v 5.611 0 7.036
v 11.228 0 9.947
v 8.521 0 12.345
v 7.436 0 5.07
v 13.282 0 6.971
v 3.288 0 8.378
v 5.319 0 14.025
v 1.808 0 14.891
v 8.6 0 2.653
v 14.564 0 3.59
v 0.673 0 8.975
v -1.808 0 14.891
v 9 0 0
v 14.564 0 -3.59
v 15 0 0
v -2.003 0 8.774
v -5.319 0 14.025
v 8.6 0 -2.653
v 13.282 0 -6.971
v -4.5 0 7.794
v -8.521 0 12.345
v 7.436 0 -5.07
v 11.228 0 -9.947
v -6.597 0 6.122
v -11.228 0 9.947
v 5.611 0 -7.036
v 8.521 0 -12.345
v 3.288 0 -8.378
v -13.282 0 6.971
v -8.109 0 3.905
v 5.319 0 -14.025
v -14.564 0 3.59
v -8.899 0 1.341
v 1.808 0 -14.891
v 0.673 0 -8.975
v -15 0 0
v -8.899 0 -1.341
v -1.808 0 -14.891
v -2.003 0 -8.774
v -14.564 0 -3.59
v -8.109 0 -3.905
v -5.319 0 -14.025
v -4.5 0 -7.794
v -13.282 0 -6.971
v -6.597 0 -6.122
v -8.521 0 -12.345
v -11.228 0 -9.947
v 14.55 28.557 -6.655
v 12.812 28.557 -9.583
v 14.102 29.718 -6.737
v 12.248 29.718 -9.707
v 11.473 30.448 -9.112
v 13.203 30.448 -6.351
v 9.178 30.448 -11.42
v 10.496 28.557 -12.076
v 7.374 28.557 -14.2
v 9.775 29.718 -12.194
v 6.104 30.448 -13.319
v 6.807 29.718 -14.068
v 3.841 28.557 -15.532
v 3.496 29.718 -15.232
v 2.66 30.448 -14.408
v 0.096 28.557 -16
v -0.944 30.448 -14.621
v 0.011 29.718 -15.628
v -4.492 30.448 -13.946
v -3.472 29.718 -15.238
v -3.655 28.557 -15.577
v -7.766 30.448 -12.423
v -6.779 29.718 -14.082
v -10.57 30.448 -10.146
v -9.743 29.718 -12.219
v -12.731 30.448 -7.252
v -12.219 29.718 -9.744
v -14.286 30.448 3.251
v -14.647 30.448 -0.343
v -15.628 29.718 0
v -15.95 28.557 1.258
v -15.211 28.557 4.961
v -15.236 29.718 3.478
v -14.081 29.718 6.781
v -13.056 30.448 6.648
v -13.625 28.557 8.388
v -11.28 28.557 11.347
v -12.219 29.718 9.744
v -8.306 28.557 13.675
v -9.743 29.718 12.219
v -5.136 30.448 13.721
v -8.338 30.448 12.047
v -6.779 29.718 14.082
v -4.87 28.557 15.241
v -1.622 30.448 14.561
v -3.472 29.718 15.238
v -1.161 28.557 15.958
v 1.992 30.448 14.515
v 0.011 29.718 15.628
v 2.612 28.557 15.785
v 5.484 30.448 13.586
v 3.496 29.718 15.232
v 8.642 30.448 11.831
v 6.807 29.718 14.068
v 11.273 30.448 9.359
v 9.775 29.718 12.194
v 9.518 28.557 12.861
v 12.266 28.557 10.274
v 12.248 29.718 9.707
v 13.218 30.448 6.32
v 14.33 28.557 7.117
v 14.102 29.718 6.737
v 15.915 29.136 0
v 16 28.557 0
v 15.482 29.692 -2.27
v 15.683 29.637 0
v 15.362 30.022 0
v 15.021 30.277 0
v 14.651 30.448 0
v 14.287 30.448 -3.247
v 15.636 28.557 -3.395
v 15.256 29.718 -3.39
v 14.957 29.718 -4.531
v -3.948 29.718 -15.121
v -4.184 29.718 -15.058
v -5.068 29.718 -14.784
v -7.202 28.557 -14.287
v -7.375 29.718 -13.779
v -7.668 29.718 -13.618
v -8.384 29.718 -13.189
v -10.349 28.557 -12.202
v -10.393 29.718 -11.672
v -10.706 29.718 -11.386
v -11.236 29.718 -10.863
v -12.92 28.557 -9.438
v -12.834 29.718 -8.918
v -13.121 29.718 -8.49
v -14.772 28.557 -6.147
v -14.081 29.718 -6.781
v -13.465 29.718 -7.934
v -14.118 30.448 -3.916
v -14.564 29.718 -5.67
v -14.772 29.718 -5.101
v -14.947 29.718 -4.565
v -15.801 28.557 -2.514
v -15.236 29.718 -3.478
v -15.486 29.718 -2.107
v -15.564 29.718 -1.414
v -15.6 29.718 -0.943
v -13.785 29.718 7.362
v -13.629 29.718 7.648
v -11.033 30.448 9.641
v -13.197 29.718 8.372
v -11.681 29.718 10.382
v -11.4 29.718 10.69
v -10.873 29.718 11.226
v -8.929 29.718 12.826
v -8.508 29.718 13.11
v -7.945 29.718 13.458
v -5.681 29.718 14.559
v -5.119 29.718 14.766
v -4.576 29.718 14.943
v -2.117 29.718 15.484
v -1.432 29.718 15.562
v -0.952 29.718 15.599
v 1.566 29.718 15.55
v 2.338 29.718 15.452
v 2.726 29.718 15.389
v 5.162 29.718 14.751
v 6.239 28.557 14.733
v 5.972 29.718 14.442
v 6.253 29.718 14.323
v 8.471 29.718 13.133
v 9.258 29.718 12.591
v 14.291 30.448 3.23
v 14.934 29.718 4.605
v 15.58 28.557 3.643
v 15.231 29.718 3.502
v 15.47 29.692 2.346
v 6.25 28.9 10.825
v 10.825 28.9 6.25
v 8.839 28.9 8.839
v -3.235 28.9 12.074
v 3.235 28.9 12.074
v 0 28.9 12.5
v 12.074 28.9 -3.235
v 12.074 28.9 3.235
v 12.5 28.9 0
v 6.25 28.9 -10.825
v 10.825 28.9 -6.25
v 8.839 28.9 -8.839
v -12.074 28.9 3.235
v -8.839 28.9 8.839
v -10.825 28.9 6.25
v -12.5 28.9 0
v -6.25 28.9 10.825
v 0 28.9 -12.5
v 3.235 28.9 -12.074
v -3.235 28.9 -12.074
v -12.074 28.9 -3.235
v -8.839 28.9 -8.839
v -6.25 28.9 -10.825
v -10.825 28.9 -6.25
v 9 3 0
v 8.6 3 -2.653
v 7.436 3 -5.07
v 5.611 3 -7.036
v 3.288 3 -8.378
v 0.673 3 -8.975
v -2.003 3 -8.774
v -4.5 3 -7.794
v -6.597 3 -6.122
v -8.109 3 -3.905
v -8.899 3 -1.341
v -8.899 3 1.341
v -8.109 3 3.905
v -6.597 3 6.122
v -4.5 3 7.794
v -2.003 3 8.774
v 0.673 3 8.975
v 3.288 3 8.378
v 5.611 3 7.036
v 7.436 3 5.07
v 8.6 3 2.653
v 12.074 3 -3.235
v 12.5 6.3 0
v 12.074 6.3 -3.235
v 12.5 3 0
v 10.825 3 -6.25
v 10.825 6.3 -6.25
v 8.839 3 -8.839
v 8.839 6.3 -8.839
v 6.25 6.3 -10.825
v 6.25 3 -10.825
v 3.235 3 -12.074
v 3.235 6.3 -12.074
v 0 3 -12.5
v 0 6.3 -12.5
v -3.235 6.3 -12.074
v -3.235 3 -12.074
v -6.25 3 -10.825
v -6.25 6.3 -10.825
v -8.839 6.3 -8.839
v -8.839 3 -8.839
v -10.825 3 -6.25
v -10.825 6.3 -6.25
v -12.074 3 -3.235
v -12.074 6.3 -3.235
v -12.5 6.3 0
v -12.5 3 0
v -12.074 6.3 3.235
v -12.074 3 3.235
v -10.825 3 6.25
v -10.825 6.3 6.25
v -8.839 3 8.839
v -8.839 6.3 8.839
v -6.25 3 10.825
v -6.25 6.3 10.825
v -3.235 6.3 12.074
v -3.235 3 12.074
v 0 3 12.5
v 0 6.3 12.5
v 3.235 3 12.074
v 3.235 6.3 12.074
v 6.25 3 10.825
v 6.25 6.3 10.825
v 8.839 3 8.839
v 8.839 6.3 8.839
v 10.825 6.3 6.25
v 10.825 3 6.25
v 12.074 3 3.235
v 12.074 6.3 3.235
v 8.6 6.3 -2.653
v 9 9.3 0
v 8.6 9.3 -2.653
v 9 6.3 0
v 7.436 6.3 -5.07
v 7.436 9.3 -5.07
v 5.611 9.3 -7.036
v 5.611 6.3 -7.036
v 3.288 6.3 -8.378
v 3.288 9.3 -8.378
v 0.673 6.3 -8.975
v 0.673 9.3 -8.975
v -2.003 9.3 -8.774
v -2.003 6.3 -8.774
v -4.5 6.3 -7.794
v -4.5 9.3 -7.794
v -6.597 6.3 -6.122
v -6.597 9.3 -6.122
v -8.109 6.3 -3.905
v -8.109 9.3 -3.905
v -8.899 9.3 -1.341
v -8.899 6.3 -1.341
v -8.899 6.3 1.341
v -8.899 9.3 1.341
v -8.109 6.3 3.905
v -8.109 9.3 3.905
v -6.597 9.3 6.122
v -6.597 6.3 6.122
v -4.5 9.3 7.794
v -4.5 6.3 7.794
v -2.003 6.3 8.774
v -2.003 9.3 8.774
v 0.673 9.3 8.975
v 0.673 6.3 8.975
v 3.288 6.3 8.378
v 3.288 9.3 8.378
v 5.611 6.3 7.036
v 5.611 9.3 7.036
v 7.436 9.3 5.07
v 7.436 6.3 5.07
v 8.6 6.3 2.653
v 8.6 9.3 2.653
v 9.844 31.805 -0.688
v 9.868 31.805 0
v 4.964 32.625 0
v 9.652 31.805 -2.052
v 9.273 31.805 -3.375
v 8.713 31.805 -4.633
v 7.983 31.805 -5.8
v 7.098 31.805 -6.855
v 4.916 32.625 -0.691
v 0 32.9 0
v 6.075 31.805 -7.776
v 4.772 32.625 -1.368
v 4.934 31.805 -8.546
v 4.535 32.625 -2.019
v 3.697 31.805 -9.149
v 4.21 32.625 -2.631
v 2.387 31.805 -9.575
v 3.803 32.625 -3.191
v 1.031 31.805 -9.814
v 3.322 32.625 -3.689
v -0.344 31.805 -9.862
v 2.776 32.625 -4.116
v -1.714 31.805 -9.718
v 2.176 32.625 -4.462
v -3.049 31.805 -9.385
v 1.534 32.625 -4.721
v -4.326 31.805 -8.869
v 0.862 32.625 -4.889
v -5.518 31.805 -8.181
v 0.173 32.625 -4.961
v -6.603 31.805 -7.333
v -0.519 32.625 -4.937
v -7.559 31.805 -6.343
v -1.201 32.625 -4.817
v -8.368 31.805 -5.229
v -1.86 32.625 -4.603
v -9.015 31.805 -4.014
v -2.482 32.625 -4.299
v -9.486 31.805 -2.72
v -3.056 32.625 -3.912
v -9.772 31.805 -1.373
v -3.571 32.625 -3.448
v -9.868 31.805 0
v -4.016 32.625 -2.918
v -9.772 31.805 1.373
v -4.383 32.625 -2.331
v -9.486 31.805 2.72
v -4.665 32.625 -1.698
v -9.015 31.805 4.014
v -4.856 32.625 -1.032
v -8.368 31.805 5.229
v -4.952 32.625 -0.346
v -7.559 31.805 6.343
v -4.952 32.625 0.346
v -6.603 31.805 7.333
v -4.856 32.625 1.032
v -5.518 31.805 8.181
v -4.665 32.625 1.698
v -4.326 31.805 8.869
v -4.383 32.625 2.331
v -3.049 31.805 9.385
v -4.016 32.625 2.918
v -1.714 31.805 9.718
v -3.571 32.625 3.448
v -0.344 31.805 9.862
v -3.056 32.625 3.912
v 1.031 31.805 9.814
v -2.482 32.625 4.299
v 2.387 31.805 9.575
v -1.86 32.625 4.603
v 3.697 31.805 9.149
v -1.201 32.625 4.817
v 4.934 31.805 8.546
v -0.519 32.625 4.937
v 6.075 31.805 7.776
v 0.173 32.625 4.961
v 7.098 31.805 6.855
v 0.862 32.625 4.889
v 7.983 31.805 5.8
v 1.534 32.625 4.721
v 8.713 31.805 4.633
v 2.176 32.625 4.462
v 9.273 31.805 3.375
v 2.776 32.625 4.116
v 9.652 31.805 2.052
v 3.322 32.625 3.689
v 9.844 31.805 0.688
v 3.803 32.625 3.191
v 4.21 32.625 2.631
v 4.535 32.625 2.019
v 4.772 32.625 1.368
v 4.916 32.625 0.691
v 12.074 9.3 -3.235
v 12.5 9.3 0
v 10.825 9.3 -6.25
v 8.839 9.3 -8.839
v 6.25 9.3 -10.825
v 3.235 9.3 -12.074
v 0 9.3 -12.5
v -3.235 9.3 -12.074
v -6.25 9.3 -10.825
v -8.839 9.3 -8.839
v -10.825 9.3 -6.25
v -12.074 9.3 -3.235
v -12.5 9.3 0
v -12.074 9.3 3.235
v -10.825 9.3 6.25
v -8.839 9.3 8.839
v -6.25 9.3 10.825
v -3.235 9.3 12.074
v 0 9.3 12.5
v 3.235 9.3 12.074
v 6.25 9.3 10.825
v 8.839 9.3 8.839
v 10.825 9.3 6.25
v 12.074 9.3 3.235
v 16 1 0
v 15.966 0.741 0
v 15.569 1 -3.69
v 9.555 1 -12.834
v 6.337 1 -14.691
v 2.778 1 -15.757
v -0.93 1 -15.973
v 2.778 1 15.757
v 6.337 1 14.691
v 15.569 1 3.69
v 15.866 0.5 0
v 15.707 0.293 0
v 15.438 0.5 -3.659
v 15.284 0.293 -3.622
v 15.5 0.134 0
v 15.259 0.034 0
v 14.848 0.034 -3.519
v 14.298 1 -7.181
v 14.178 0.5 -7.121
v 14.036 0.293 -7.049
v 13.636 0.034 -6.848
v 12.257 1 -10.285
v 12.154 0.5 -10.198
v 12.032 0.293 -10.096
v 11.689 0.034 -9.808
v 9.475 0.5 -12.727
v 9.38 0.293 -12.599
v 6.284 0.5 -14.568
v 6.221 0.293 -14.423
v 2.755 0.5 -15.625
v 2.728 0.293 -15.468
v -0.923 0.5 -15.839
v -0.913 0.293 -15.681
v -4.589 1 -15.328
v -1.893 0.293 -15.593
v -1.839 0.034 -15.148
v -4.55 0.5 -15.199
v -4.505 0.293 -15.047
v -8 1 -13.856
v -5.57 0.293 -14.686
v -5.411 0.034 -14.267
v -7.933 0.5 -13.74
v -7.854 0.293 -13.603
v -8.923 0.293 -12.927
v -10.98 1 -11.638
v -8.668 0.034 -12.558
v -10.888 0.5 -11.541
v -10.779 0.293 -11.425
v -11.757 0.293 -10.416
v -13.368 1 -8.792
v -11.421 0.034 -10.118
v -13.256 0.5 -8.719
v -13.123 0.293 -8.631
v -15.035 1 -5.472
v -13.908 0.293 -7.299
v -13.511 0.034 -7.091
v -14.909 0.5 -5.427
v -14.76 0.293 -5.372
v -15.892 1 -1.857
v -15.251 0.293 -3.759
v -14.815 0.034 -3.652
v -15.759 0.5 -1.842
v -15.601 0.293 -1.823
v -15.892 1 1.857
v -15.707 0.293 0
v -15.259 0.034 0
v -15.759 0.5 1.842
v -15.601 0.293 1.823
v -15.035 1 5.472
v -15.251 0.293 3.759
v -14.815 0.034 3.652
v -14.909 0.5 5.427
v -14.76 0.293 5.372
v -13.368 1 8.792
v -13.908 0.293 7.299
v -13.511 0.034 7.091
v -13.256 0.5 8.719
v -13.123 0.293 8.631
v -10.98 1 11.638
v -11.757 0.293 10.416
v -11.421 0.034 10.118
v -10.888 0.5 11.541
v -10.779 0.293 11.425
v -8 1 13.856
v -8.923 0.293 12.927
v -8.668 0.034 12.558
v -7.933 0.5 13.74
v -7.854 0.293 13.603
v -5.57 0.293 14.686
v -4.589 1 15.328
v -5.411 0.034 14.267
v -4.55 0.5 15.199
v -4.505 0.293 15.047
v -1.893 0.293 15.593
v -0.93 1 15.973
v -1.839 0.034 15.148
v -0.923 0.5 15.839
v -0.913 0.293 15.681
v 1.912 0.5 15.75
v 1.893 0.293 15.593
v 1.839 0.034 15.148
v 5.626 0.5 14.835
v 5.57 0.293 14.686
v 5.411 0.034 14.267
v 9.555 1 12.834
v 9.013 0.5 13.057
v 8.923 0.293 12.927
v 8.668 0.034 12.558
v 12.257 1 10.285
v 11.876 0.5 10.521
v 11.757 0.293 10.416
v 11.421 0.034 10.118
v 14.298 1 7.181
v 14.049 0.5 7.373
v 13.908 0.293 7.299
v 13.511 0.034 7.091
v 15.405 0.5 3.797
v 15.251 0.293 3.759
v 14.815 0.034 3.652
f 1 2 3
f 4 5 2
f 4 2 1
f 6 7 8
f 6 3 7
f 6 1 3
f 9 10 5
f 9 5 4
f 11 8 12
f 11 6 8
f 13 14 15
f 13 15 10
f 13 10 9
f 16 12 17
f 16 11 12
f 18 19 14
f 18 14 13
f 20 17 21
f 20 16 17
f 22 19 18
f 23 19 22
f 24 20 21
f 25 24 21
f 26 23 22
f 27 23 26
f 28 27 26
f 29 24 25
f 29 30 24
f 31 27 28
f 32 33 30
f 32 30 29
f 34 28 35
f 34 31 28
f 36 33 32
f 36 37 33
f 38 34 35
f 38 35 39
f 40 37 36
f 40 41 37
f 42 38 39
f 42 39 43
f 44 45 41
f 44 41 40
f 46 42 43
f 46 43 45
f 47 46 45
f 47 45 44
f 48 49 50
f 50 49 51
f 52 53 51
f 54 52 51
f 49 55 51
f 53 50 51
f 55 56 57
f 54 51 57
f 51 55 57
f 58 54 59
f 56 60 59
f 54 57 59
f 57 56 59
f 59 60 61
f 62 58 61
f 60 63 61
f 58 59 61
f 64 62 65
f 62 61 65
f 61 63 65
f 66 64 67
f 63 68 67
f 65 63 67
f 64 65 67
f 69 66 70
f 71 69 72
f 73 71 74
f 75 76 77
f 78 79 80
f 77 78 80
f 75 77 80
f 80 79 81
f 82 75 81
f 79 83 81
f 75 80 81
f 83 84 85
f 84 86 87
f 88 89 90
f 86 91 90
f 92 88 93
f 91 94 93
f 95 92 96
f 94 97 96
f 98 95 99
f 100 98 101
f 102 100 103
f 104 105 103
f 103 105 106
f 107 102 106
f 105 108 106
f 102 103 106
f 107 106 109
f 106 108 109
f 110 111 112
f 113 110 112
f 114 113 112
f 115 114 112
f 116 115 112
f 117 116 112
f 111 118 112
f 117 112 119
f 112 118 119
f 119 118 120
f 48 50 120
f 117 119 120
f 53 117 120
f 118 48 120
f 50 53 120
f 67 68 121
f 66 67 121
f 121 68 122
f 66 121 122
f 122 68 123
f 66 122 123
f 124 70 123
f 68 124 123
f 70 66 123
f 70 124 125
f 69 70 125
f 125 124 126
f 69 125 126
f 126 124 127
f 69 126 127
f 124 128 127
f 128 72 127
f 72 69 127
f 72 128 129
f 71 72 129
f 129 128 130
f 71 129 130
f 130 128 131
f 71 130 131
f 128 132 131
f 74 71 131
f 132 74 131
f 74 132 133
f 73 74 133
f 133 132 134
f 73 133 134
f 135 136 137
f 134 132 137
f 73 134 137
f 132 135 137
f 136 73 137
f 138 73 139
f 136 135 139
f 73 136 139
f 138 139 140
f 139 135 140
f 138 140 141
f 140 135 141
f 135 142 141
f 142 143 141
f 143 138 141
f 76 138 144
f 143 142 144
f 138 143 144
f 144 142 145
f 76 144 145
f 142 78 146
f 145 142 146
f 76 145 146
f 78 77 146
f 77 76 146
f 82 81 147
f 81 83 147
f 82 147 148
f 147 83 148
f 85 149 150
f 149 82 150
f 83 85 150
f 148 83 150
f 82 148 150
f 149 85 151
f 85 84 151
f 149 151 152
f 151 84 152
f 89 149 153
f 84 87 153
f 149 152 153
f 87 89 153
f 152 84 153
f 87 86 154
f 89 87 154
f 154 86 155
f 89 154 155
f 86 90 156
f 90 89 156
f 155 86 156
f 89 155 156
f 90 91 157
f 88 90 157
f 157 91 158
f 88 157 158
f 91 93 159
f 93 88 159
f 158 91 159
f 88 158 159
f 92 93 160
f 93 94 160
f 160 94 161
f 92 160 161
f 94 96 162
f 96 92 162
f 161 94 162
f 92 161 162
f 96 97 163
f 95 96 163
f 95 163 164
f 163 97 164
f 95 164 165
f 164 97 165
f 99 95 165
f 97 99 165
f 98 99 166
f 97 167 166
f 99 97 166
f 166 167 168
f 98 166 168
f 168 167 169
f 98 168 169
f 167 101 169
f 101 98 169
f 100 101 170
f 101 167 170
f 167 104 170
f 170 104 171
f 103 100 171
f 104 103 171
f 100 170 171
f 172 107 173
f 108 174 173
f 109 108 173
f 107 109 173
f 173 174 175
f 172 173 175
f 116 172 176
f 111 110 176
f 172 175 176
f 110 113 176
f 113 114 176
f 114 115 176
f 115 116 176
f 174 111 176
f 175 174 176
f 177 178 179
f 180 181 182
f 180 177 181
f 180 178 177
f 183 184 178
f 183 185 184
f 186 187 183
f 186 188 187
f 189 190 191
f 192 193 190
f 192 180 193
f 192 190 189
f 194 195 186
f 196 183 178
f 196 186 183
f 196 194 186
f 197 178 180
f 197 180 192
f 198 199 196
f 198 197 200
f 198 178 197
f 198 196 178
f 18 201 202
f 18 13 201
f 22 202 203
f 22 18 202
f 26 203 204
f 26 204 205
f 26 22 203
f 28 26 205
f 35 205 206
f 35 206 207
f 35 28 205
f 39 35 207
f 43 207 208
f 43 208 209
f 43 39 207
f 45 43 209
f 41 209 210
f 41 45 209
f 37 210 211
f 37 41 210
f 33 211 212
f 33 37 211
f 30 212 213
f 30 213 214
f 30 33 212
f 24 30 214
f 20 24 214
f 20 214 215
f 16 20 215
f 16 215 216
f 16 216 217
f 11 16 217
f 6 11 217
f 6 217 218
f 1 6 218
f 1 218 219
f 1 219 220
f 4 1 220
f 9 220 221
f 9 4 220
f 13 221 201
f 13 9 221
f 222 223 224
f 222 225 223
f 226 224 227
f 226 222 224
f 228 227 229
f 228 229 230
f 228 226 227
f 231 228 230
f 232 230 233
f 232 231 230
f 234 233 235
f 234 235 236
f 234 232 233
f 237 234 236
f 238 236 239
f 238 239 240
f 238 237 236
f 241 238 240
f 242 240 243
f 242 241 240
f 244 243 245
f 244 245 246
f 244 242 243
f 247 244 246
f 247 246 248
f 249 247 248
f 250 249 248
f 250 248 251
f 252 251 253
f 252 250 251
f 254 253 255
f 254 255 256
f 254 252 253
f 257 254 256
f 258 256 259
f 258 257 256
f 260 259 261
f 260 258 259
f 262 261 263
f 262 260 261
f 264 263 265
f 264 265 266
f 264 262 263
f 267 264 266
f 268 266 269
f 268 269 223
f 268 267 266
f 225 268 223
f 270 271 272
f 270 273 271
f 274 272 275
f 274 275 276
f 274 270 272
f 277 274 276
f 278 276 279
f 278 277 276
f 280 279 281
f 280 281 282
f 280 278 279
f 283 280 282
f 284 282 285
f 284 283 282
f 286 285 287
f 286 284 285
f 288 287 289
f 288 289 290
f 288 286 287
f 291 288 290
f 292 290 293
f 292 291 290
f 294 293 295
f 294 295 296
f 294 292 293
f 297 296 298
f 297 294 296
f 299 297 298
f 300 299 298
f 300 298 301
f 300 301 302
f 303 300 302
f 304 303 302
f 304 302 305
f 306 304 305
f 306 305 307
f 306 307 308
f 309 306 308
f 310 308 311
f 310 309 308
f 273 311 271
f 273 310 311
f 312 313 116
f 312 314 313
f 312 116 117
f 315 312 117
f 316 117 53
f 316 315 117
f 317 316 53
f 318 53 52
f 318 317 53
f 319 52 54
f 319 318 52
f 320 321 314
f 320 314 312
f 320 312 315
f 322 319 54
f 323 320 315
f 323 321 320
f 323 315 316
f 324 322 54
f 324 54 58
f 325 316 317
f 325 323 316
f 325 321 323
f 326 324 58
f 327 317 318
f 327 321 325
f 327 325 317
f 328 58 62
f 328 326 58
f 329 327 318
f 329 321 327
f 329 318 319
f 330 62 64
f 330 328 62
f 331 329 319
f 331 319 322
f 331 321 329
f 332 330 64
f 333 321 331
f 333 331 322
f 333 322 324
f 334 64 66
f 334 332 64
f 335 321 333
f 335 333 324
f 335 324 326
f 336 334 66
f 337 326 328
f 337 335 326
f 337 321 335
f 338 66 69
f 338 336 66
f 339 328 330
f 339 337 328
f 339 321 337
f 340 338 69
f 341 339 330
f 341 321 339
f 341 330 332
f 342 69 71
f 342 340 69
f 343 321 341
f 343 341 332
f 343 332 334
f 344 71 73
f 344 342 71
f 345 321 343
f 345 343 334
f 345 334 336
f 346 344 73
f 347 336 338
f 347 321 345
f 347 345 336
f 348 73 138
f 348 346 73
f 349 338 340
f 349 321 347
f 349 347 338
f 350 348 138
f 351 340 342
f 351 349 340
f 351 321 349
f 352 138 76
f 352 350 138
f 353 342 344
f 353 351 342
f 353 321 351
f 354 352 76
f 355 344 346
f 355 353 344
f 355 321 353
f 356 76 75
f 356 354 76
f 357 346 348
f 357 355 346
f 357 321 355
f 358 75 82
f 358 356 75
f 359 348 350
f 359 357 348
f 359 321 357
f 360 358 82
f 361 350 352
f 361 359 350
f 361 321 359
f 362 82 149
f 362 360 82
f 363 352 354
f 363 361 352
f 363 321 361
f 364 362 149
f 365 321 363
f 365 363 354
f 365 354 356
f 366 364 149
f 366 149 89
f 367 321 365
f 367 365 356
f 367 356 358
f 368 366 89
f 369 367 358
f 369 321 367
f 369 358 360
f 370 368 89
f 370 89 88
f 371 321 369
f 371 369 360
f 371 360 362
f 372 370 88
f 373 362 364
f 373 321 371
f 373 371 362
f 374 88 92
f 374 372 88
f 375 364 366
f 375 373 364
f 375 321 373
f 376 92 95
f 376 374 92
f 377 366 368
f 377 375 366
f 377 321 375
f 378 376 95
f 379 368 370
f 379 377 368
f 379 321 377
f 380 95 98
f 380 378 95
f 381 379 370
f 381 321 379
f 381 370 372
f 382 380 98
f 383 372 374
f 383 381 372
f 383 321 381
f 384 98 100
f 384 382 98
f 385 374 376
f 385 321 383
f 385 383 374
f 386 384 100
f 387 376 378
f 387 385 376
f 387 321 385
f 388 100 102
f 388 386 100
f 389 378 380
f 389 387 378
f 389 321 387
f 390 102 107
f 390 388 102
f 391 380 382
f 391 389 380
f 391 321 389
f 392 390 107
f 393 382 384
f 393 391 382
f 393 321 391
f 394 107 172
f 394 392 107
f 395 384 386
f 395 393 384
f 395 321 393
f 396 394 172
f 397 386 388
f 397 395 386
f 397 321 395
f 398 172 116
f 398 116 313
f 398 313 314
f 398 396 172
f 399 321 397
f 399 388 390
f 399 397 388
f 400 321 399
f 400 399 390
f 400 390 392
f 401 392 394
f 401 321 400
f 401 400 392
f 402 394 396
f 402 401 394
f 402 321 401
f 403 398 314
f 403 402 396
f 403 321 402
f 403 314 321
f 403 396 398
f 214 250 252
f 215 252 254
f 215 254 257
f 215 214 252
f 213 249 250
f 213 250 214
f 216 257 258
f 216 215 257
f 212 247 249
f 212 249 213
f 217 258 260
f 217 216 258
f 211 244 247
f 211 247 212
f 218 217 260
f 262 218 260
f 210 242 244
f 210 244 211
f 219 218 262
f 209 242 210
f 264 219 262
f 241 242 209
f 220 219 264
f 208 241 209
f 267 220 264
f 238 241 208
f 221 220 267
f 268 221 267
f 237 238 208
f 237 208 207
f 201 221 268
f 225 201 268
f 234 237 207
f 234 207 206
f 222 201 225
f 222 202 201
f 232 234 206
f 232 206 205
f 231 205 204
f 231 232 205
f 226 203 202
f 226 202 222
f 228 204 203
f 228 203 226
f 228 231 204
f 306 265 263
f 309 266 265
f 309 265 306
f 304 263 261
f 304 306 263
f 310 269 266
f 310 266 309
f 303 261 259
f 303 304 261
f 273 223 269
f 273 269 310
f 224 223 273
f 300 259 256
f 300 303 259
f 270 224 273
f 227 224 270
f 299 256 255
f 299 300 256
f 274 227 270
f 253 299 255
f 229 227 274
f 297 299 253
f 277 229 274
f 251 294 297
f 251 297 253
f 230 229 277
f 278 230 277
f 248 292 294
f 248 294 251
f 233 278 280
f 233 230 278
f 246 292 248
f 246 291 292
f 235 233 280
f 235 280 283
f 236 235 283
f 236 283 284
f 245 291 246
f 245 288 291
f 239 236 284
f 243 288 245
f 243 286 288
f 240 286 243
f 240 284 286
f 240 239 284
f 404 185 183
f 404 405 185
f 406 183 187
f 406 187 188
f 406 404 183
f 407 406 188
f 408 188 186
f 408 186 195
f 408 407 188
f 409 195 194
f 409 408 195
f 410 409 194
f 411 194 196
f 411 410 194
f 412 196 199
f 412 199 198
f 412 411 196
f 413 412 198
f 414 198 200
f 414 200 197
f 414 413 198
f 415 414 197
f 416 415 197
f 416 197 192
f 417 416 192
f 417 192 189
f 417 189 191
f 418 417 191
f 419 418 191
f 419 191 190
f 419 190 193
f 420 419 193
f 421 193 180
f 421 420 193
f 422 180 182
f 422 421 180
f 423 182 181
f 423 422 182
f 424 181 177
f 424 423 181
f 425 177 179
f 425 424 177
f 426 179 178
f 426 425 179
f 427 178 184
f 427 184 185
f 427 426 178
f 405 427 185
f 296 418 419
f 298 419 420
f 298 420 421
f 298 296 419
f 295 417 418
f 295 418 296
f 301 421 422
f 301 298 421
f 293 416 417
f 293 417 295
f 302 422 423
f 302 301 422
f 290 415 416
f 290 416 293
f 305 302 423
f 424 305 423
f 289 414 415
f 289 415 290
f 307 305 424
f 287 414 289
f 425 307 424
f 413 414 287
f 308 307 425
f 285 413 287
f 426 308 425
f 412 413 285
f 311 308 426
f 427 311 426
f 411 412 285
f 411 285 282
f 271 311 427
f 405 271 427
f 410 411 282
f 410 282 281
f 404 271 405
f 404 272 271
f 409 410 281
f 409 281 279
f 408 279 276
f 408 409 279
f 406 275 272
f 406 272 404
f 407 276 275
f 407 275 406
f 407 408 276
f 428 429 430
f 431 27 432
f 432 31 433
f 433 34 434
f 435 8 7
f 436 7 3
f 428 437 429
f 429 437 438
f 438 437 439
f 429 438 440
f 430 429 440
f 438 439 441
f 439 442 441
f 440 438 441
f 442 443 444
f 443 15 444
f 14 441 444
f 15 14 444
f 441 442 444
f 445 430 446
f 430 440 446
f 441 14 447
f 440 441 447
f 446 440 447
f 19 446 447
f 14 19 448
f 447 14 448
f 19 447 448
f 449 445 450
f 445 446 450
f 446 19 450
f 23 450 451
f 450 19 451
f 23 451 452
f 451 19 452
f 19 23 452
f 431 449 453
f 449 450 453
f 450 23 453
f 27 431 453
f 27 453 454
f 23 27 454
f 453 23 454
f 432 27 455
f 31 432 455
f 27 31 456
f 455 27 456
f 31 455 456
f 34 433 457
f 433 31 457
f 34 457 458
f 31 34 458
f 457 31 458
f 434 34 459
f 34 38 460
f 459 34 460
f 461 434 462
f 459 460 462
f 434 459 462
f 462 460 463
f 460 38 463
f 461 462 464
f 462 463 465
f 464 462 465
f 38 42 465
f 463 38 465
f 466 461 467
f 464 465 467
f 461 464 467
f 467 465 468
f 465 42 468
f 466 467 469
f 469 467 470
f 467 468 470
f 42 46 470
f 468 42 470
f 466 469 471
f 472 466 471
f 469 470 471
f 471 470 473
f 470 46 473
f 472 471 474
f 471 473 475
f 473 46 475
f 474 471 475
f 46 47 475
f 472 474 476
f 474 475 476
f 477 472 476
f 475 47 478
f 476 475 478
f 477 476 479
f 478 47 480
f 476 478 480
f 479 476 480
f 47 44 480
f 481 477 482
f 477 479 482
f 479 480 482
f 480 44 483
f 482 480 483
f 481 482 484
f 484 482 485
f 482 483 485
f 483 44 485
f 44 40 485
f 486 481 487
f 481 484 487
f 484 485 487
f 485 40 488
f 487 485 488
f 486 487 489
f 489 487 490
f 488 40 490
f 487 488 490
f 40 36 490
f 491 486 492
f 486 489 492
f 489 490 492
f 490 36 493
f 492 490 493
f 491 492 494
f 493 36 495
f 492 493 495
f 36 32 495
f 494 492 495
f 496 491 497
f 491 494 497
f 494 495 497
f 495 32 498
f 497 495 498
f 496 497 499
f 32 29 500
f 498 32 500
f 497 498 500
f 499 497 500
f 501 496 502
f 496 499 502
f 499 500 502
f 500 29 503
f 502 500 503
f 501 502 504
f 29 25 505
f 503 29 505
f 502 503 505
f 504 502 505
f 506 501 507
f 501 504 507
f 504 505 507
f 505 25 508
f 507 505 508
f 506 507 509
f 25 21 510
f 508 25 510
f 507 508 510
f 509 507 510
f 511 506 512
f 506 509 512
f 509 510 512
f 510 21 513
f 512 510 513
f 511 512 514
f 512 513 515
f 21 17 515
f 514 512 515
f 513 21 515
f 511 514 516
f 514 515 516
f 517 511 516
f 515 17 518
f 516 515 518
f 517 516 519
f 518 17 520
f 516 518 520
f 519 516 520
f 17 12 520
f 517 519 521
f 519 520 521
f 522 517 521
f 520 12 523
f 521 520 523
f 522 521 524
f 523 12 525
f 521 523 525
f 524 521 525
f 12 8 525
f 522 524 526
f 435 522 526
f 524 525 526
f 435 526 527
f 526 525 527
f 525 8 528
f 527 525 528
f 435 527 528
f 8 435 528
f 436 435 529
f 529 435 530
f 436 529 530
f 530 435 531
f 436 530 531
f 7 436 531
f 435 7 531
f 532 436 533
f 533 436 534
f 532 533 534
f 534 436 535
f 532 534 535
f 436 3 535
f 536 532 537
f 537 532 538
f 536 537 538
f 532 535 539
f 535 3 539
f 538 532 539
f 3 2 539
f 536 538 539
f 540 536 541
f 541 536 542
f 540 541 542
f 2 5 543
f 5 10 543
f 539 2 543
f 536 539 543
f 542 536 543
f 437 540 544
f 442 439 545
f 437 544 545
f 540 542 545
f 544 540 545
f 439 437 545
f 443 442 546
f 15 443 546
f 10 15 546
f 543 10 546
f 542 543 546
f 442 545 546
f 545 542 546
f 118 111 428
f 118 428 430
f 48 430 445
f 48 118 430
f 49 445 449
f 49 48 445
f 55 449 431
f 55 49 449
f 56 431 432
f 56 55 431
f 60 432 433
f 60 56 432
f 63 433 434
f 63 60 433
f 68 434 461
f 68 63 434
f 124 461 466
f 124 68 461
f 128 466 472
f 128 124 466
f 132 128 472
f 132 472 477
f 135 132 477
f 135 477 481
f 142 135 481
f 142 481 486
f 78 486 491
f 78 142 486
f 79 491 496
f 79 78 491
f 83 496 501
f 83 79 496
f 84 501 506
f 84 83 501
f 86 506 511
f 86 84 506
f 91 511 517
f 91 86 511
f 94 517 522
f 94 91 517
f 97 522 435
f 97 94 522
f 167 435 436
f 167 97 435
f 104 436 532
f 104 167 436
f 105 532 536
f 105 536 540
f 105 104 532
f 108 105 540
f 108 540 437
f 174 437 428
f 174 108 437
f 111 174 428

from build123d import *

# Parameters (mm, degrees)
CONG_1_R = 2
CONG_2_R = 1


with BuildPart() as part:
    # Esquisse1 → Révolution1 (revolve)
    with BuildSketch(Plane.XY, mode=Mode.PRIVATE) as r_volution1_sk:
        with BuildLine():
            Line((0, 31.9), (0, 28.9))
            Line((0, 28.9), (-12.5, 28.9))
            Line((-12.5, 28.9), (-12.5, 12.6))
            Line((-12.5, 12.6), (-12.5, 9.3))
            Line((-12.5, 9.3), (-9, 9.3))
            Line((-9, 9.3), (-9, 6.3))
            Line((-9, 6.3), (-12.5, 6.3))
            Line((-12.5, 6.3), (-12.5, 3))
            Line((-12.5, 3), (-9, 3))
            Line((-9, 3), (-9, 0))
            Line((-9, 0), (-12.5, 0))
            Line((-12.5, 0), (-16, 0))
            Line((-16, 0), (-16, 29.95948169))
            ThreePointArc((-16, 29.95948169), (-8.133981927, 32.158765663), (0, 32.9))
            Line((0, 32.9), (0, 31.9))
        make_face()
    revolve(r_volution1_sk.sketch.rotate(Axis((0, 0, 0), (0, 1, 0)), 180), axis=Axis((0, 0, 0), (0, 1, 0)))

    # Congé1
    cong_1_edges = [part.edges().sort_by_distance(p)[0] for p in [
        (-16, 29.95948169, 0),
    ]]
    fillet(cong_1_edges, radius=CONG_1_R)

    # Congé2
    cong_2_edges = [part.edges().sort_by_distance(p)[0] for p in [
        (-16, 0, 0),
    ]]
    fillet(cong_2_edges, radius=CONG_2_R)


solid = part.part
